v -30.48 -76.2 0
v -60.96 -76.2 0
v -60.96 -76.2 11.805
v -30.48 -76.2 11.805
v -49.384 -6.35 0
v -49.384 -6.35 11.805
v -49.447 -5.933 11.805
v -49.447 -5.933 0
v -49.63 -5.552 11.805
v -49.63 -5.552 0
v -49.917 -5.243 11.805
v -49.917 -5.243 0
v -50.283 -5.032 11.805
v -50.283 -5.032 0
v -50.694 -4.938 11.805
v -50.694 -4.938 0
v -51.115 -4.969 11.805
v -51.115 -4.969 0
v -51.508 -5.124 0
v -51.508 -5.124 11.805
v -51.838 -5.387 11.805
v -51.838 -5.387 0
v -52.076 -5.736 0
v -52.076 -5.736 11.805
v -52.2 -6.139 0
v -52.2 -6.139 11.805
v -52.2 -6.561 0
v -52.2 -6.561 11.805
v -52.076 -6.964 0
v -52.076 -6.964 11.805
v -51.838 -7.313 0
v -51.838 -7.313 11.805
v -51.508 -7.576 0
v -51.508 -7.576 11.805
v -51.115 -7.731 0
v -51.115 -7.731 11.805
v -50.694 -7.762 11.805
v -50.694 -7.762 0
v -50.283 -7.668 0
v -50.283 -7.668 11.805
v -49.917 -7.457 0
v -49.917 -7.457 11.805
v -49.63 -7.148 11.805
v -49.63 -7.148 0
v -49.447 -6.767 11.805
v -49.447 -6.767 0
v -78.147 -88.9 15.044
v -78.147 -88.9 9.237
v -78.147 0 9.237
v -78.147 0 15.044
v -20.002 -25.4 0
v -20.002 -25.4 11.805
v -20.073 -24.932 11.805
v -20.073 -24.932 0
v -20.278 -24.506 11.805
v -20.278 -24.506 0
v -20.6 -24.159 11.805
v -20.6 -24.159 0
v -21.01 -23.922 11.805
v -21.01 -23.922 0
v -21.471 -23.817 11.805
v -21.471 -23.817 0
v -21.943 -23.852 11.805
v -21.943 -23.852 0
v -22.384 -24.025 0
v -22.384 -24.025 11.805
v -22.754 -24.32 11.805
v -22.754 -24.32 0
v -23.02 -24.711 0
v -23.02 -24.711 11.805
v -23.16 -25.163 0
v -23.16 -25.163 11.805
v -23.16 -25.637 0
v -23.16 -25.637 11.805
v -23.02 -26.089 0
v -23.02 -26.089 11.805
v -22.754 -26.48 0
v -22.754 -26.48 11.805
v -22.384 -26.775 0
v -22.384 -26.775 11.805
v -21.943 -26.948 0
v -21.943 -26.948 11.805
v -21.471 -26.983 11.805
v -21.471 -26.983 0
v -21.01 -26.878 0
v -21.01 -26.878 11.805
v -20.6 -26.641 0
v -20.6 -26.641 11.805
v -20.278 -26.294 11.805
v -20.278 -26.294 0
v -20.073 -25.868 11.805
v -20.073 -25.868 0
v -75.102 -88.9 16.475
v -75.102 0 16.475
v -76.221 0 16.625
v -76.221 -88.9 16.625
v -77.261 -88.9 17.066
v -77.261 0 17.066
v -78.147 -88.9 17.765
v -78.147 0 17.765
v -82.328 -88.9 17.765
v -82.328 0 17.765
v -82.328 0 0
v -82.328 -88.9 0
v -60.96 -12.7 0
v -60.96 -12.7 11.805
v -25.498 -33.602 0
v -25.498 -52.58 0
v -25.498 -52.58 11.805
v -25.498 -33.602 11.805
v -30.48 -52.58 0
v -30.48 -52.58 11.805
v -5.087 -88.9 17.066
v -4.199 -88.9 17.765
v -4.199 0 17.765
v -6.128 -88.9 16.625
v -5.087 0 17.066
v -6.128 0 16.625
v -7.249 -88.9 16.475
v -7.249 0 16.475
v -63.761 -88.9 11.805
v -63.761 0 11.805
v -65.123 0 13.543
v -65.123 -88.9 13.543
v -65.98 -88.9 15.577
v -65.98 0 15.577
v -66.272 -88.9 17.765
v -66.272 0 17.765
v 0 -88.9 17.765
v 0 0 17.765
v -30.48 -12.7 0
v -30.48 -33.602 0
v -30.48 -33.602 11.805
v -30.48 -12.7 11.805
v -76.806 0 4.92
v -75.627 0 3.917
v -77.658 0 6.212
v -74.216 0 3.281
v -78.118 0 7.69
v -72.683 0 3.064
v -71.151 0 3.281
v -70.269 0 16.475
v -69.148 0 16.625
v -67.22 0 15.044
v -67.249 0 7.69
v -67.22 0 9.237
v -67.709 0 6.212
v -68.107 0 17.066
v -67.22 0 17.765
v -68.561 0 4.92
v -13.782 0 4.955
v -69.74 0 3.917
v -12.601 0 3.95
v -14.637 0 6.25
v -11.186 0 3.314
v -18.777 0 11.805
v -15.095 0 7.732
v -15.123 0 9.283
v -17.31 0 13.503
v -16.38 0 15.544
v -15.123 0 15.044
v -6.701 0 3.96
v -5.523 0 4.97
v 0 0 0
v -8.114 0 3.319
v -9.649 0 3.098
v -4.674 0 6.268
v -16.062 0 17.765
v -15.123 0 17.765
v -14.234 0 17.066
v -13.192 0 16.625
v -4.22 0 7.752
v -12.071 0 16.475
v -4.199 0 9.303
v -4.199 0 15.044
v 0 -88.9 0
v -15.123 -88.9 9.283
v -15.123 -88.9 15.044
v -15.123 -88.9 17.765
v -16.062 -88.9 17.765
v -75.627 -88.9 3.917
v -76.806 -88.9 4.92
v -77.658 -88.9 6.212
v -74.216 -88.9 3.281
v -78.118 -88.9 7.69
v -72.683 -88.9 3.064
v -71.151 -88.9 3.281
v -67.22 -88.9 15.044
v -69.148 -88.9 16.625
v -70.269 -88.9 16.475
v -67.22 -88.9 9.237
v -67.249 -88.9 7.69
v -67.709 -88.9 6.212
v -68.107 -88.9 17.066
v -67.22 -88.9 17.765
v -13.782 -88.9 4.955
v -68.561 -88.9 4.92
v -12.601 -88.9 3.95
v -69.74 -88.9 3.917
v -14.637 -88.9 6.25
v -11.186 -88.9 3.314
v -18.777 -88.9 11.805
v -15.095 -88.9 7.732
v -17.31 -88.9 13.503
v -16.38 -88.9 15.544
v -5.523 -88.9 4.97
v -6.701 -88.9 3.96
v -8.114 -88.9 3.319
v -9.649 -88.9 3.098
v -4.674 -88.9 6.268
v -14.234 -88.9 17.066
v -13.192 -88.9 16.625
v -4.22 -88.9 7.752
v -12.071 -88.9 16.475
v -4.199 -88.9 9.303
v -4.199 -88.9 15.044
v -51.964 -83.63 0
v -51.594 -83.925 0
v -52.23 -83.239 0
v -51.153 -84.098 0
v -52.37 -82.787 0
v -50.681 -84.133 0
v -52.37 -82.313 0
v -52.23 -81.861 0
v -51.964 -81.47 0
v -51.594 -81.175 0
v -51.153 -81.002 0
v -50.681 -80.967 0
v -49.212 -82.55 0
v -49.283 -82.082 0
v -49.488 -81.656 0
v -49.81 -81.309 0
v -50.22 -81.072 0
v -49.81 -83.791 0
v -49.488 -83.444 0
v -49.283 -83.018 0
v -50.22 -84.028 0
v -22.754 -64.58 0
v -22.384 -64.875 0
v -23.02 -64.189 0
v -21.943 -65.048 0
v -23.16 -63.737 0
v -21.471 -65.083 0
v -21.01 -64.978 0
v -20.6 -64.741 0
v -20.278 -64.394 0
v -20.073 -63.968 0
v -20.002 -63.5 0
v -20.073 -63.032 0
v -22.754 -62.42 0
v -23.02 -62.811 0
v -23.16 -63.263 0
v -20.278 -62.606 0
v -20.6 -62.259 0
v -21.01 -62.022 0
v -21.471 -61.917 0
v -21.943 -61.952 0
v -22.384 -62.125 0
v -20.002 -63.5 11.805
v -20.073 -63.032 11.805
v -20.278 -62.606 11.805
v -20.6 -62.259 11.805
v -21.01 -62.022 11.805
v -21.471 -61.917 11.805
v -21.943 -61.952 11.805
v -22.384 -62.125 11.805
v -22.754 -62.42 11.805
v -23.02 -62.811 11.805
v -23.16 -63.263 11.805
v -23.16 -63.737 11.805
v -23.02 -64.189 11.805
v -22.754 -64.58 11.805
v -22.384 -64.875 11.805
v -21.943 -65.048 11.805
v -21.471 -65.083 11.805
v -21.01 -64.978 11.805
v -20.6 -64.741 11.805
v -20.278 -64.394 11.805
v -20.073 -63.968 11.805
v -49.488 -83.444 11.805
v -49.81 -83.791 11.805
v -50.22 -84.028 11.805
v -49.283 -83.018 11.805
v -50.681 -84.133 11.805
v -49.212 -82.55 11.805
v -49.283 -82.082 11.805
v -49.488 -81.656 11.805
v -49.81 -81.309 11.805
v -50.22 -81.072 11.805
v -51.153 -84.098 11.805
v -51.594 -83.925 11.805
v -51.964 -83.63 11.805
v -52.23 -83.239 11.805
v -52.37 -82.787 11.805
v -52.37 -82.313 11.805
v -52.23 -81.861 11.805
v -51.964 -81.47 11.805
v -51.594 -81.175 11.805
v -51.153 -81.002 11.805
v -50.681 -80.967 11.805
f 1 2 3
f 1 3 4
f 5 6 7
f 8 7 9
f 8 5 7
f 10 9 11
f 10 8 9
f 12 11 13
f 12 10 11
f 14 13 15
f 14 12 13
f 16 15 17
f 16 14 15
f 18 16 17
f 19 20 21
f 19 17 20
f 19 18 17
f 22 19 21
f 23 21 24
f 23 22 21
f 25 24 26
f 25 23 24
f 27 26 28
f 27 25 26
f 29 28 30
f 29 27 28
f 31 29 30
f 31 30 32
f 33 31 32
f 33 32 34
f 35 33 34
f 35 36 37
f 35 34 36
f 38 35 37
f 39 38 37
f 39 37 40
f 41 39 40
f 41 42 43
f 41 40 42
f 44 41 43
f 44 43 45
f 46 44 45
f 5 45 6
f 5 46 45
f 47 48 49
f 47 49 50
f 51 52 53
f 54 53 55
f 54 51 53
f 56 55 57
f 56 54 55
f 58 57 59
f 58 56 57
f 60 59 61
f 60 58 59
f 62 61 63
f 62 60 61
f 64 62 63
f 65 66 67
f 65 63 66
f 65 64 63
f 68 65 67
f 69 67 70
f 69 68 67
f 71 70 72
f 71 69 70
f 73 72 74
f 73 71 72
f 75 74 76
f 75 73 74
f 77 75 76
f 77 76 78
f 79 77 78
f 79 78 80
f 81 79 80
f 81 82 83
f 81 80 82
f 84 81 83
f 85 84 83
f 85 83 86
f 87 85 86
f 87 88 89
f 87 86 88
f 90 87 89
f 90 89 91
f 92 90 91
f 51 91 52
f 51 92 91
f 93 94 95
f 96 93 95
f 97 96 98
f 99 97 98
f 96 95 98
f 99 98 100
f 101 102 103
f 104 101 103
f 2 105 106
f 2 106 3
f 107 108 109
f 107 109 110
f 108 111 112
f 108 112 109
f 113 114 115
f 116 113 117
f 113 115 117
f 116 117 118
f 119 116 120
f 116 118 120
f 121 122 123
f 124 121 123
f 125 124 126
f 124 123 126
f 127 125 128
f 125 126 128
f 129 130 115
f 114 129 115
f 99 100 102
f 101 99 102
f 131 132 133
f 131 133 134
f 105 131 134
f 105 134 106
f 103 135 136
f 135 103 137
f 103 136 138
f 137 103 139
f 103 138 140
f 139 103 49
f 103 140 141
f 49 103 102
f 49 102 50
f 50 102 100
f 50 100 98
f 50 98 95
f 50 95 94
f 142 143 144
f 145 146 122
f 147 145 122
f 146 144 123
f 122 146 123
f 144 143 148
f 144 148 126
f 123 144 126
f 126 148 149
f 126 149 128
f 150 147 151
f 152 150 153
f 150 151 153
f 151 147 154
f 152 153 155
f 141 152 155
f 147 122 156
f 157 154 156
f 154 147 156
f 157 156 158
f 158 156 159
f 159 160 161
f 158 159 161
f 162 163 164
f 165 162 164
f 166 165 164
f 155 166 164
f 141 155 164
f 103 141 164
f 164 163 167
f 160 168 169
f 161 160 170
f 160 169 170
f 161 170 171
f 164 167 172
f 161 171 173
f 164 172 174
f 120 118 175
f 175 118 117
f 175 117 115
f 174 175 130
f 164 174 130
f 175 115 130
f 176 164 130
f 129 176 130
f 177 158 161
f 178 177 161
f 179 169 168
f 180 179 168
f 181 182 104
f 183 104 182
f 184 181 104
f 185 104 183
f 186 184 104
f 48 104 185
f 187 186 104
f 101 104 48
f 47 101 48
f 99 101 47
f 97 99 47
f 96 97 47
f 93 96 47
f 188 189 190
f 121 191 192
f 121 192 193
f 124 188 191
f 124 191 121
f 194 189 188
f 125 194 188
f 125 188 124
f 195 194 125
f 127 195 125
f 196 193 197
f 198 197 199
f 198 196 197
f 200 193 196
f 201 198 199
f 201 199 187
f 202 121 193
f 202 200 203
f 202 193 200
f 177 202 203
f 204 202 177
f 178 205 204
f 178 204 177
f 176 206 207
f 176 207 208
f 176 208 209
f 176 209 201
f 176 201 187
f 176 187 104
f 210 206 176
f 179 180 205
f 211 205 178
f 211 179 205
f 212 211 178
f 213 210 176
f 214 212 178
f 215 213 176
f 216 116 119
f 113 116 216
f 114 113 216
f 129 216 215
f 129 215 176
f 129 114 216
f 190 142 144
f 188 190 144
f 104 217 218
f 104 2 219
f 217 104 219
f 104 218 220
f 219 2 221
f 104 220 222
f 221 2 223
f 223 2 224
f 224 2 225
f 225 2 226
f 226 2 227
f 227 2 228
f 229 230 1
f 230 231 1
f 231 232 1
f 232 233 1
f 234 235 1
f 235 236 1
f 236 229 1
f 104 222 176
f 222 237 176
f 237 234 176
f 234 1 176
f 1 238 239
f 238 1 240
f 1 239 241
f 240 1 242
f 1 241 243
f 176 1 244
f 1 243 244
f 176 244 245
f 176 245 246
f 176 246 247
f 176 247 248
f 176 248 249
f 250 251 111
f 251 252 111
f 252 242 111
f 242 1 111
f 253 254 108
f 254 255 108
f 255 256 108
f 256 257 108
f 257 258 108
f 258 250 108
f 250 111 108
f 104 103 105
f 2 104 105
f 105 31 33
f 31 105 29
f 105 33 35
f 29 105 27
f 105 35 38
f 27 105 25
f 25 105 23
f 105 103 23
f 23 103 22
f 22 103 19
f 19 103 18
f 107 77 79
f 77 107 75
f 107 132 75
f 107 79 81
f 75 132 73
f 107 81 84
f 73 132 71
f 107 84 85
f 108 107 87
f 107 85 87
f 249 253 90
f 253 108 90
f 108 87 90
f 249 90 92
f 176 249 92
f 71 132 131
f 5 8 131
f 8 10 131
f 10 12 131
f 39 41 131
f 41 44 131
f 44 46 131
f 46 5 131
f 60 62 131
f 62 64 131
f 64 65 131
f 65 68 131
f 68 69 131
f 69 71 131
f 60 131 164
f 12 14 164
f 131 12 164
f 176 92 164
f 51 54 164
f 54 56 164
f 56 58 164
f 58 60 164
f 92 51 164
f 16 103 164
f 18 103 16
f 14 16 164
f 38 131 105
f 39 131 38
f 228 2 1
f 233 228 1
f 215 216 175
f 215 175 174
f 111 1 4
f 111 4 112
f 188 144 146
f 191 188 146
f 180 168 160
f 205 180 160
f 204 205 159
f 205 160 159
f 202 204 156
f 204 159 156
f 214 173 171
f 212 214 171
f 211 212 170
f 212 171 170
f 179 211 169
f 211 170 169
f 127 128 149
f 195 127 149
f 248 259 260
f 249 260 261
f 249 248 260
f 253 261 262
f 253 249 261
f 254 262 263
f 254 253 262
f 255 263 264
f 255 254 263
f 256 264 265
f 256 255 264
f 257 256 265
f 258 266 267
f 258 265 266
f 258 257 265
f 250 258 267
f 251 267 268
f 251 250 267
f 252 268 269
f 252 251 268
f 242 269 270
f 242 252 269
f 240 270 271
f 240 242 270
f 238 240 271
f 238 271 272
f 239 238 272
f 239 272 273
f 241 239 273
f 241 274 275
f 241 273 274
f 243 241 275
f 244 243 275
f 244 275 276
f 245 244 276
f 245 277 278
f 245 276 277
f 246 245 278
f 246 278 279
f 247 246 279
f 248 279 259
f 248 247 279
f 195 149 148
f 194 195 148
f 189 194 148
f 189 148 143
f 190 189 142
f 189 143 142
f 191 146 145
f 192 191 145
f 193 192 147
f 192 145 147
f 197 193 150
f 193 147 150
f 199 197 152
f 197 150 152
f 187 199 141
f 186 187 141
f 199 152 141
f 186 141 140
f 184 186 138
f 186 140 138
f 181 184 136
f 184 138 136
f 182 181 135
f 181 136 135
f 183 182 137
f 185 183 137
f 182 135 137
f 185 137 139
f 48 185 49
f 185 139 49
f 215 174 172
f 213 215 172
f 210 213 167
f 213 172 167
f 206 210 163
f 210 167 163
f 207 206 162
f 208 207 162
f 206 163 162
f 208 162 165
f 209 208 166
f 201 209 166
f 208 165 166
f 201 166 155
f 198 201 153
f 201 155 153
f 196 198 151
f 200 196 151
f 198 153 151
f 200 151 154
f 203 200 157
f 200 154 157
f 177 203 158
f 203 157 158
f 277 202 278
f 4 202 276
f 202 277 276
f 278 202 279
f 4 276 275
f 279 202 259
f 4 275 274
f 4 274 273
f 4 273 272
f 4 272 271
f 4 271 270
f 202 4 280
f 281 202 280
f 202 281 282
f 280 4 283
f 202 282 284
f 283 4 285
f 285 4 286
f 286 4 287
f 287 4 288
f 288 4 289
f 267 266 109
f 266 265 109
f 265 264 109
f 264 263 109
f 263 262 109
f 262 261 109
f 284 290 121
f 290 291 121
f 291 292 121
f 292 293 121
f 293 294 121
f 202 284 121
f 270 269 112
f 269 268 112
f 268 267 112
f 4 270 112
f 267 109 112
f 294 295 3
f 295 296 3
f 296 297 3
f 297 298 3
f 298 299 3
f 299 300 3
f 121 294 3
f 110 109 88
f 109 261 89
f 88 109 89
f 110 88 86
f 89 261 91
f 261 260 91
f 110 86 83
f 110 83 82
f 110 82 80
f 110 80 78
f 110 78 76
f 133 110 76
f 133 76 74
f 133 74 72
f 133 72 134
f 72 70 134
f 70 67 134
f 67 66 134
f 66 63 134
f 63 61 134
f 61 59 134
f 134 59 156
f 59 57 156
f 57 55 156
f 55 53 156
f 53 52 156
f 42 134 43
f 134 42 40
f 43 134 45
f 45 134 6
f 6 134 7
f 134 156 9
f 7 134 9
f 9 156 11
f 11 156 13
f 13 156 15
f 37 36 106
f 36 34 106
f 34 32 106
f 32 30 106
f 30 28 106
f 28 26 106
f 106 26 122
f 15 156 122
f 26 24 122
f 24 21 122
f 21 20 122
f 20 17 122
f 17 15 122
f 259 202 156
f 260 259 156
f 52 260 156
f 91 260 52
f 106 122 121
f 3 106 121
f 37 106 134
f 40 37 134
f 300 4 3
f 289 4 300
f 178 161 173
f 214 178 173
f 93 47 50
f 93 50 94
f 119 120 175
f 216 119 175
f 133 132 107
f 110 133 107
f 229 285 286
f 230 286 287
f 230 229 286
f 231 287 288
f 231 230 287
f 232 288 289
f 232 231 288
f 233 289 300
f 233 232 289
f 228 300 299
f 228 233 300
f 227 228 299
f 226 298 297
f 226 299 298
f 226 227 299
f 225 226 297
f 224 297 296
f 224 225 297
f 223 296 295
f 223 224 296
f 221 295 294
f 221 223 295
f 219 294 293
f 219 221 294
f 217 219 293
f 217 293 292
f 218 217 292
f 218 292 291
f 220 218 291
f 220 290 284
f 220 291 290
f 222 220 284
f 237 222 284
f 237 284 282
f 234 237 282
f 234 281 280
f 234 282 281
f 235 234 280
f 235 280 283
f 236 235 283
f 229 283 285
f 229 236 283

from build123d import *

# Parameters (mm, degrees)
F1_DEPTH = 88.9
F2_W     = 4.9823306459
F2_H     = 18.9774408937
F3_DEPTH = 127
F4_R     = 1.5875
F5_DEPTH = 127
F6_R     = 1.4161925478
F6_R_2   = 1.5875
F7_DEPTH = 76.2


with BuildPart() as f1:
    # F0 (on Front) → F1 (new body)
    with BuildSketch(Plane.XZ):
        with BuildLine():
            Line((-22.8439420462, 0), (0, 0))
            Line((0, 0), (0, 17.765391618))
            Line((0, 17.765391618), (-4.1987905279, 17.765391618))
            Line((-4.1987905279, 17.765391618), (-4.1987905279, 16.4750870317))
            Line((-4.1987905279, 16.4750870317), (-4.1987905279, 15.044271946))
            Line((-4.1987905279, 15.044271946), (-4.1987905279, 9.3032421722))
            ThreePointArc((-4.1987905279, 9.3032421722), (-9.6494707531, 3.097937748), (-15.1226427406, 9.2834131792))
            Line((-15.1226427406, 9.2834131792), (-15.1226427406, 15.044271946))
            Line((-15.1226427406, 15.044271946), (-15.1226427406, 16.4750870317))
            Line((-15.1226427406, 16.4750870317), (-15.1226427406, 17.765391618))
            Line((-15.1226427406, 17.765391618), (-16.0616673529, 17.765391618))
            Line((-16.0616673529, 17.765391618), (-16.0616673529, 11.8045024574))
            Line((-16.0616673529, 11.8045024574), (-18.7766868621, 11.8045024574))
            Line((-18.7766868621, 11.8045024574), (-63.7612715364, 11.8045024574))
            Line((-63.7612715364, 11.8045024574), (-66.2720091641, 11.8045024574))
            Line((-66.2720091641, 11.8045024574), (-66.2720091641, 17.765391618))
            Line((-66.2720091641, 17.765391618), (-67.2196410596, 17.765391618))
            Line((-67.2196410596, 17.765391618), (-67.2196410596, 16.4750870317))
            Line((-67.2196410596, 16.4750870317), (-67.2196410596, 15.044271946))
            Line((-67.2196410596, 15.044271946), (-67.2196410596, 9.2371329665))
            ThreePointArc((-67.2196410596, 9.2371329665), (-72.6834610105, 3.0635382866), (-78.1472809613, 9.2371329665))
            Line((-78.1472809613, 9.2371329665), (-78.1472809613, 15.044271946))
            Line((-78.1472809613, 15.044271946), (-78.1472809613, 16.4750870317))
            Line((-78.1472809613, 16.4750870317), (-78.1472809613, 17.765391618))
            Line((-78.1472809613, 17.765391618), (-82.3283270001, 17.765391618))
            Line((-82.3283270001, 17.765391618), (-82.3283270001, 0))
            Line((-82.3283270001, 0), (-22.8439420462, 0))
        make_face()
        with BuildLine():
            Line((-4.1987905279, 16.4750870317), (-4.1987905279, 17.765391618))
            ThreePointArc((-4.1987905279, 17.765391618), (-5.5930091509, 16.810932091), (-7.2489217855, 16.4750870317))
            Line((-7.2489217855, 16.4750870317), (-4.1987905279, 16.4750870317))
        make_face()
        Polygon((-4.1987905279, 15.044271946), (-4.1987905279, 16.4750870317), (-7.2489217855, 16.4750870317), align=None)
        with BuildLine():
            ThreePointArc((-75.1015543938, 16.4750870317), (-76.755438931, 16.8109674547), (-78.1472809613, 17.765391618))
            Line((-78.1472809613, 17.765391618), (-78.1472809613, 16.4750870317))
            Line((-78.1472809613, 16.4750870317), (-75.1015543938, 16.4750870317))
        make_face()
        Polygon((-75.1015543938, 16.4750870317), (-78.1472809613, 16.4750870317), (-78.1472809613, 15.044271946), align=None)
        Polygon((-15.1226427406, 16.4750870317), (-15.1226427406, 15.044271946), (-12.0709454641, 16.4750870317), align=None)
        with BuildLine():
            Line((-15.1226427406, 17.765391618), (-15.1226427406, 16.4750870317))
            Line((-15.1226427406, 16.4750870317), (-12.0709454641, 16.4750870317))
            ThreePointArc((-12.0709454641, 16.4750870317), (-13.7275792644, 16.8109195511), (-15.1226427406, 17.765391618))
        make_face()
        Polygon((-70.2685788274, 16.4750870317), (-67.2196410596, 15.044271946), (-67.2196410596, 16.4750870317), align=None)
        with BuildLine():
            Line((-16.0616673529, 11.8045024574), (-16.0616673529, 17.765391618))
            ThreePointArc((-16.0616673529, 17.765391618), (-16.7723874031, 14.4903522854), (-18.7766868621, 11.8045024574))
            Line((-18.7766868621, 11.8045024574), (-16.0616673529, 11.8045024574))
        make_face()
        with BuildLine():
            Line((-70.2685788274, 16.4750870317), (-67.2196410596, 16.4750870317))
            Line((-67.2196410596, 16.4750870317), (-67.2196410596, 17.765391618))
            ThreePointArc((-67.2196410596, 17.765391618), (-68.6132157677, 16.8109416595), (-70.2685788274, 16.4750870317))
        make_face()
        with BuildLine():
            Line((-66.2720091641, 11.8045024574), (-63.7612715364, 11.8045024574))
            ThreePointArc((-63.7612715364, 11.8045024574), (-65.6187109531, 14.5313537773), (-66.2720091641, 17.765391618))
            Line((-66.2720091641, 17.765391618), (-66.2720091641, 11.8045024574))
        make_face()
    extrude(amount=F1_DEPTH)

    # F2 (on Top) → F3 (cut)
    with BuildSketch(Plane.XY):
        Polygon((-30.48, -12.7), (-60.96, -12.7), (-60.96, -76.2), (-30.48, -76.2), (-30.48, -52.5795705616), (-30.48, -33.602129668), align=None)
        with Locations((-27.988834677, -43.0908501148)):
            Rectangle(F2_W, F2_H)
    extrude(amount=F3_DEPTH, mode=Mode.SUBTRACT)

    # F4 (on Top) → F5 (cut)
    with BuildSketch(Plane.XY):
        with Locations((-21.59, -25.4)):
            Circle(F4_R)
        with Locations((-21.59, -63.5)):
            Circle(F4_R)
    extrude(amount=F5_DEPTH, mode=Mode.SUBTRACT)

    # F6 (on Top) → F7 (cut)
    with BuildSketch(Plane.XY):
        with Locations((-50.8, -6.35)):
            Circle(F6_R)
        with Locations((-50.7999993861, -82.55)):
            Circle(F6_R_2)
    extrude(amount=F7_DEPTH, mode=Mode.SUBTRACT)


solid = f1.part
